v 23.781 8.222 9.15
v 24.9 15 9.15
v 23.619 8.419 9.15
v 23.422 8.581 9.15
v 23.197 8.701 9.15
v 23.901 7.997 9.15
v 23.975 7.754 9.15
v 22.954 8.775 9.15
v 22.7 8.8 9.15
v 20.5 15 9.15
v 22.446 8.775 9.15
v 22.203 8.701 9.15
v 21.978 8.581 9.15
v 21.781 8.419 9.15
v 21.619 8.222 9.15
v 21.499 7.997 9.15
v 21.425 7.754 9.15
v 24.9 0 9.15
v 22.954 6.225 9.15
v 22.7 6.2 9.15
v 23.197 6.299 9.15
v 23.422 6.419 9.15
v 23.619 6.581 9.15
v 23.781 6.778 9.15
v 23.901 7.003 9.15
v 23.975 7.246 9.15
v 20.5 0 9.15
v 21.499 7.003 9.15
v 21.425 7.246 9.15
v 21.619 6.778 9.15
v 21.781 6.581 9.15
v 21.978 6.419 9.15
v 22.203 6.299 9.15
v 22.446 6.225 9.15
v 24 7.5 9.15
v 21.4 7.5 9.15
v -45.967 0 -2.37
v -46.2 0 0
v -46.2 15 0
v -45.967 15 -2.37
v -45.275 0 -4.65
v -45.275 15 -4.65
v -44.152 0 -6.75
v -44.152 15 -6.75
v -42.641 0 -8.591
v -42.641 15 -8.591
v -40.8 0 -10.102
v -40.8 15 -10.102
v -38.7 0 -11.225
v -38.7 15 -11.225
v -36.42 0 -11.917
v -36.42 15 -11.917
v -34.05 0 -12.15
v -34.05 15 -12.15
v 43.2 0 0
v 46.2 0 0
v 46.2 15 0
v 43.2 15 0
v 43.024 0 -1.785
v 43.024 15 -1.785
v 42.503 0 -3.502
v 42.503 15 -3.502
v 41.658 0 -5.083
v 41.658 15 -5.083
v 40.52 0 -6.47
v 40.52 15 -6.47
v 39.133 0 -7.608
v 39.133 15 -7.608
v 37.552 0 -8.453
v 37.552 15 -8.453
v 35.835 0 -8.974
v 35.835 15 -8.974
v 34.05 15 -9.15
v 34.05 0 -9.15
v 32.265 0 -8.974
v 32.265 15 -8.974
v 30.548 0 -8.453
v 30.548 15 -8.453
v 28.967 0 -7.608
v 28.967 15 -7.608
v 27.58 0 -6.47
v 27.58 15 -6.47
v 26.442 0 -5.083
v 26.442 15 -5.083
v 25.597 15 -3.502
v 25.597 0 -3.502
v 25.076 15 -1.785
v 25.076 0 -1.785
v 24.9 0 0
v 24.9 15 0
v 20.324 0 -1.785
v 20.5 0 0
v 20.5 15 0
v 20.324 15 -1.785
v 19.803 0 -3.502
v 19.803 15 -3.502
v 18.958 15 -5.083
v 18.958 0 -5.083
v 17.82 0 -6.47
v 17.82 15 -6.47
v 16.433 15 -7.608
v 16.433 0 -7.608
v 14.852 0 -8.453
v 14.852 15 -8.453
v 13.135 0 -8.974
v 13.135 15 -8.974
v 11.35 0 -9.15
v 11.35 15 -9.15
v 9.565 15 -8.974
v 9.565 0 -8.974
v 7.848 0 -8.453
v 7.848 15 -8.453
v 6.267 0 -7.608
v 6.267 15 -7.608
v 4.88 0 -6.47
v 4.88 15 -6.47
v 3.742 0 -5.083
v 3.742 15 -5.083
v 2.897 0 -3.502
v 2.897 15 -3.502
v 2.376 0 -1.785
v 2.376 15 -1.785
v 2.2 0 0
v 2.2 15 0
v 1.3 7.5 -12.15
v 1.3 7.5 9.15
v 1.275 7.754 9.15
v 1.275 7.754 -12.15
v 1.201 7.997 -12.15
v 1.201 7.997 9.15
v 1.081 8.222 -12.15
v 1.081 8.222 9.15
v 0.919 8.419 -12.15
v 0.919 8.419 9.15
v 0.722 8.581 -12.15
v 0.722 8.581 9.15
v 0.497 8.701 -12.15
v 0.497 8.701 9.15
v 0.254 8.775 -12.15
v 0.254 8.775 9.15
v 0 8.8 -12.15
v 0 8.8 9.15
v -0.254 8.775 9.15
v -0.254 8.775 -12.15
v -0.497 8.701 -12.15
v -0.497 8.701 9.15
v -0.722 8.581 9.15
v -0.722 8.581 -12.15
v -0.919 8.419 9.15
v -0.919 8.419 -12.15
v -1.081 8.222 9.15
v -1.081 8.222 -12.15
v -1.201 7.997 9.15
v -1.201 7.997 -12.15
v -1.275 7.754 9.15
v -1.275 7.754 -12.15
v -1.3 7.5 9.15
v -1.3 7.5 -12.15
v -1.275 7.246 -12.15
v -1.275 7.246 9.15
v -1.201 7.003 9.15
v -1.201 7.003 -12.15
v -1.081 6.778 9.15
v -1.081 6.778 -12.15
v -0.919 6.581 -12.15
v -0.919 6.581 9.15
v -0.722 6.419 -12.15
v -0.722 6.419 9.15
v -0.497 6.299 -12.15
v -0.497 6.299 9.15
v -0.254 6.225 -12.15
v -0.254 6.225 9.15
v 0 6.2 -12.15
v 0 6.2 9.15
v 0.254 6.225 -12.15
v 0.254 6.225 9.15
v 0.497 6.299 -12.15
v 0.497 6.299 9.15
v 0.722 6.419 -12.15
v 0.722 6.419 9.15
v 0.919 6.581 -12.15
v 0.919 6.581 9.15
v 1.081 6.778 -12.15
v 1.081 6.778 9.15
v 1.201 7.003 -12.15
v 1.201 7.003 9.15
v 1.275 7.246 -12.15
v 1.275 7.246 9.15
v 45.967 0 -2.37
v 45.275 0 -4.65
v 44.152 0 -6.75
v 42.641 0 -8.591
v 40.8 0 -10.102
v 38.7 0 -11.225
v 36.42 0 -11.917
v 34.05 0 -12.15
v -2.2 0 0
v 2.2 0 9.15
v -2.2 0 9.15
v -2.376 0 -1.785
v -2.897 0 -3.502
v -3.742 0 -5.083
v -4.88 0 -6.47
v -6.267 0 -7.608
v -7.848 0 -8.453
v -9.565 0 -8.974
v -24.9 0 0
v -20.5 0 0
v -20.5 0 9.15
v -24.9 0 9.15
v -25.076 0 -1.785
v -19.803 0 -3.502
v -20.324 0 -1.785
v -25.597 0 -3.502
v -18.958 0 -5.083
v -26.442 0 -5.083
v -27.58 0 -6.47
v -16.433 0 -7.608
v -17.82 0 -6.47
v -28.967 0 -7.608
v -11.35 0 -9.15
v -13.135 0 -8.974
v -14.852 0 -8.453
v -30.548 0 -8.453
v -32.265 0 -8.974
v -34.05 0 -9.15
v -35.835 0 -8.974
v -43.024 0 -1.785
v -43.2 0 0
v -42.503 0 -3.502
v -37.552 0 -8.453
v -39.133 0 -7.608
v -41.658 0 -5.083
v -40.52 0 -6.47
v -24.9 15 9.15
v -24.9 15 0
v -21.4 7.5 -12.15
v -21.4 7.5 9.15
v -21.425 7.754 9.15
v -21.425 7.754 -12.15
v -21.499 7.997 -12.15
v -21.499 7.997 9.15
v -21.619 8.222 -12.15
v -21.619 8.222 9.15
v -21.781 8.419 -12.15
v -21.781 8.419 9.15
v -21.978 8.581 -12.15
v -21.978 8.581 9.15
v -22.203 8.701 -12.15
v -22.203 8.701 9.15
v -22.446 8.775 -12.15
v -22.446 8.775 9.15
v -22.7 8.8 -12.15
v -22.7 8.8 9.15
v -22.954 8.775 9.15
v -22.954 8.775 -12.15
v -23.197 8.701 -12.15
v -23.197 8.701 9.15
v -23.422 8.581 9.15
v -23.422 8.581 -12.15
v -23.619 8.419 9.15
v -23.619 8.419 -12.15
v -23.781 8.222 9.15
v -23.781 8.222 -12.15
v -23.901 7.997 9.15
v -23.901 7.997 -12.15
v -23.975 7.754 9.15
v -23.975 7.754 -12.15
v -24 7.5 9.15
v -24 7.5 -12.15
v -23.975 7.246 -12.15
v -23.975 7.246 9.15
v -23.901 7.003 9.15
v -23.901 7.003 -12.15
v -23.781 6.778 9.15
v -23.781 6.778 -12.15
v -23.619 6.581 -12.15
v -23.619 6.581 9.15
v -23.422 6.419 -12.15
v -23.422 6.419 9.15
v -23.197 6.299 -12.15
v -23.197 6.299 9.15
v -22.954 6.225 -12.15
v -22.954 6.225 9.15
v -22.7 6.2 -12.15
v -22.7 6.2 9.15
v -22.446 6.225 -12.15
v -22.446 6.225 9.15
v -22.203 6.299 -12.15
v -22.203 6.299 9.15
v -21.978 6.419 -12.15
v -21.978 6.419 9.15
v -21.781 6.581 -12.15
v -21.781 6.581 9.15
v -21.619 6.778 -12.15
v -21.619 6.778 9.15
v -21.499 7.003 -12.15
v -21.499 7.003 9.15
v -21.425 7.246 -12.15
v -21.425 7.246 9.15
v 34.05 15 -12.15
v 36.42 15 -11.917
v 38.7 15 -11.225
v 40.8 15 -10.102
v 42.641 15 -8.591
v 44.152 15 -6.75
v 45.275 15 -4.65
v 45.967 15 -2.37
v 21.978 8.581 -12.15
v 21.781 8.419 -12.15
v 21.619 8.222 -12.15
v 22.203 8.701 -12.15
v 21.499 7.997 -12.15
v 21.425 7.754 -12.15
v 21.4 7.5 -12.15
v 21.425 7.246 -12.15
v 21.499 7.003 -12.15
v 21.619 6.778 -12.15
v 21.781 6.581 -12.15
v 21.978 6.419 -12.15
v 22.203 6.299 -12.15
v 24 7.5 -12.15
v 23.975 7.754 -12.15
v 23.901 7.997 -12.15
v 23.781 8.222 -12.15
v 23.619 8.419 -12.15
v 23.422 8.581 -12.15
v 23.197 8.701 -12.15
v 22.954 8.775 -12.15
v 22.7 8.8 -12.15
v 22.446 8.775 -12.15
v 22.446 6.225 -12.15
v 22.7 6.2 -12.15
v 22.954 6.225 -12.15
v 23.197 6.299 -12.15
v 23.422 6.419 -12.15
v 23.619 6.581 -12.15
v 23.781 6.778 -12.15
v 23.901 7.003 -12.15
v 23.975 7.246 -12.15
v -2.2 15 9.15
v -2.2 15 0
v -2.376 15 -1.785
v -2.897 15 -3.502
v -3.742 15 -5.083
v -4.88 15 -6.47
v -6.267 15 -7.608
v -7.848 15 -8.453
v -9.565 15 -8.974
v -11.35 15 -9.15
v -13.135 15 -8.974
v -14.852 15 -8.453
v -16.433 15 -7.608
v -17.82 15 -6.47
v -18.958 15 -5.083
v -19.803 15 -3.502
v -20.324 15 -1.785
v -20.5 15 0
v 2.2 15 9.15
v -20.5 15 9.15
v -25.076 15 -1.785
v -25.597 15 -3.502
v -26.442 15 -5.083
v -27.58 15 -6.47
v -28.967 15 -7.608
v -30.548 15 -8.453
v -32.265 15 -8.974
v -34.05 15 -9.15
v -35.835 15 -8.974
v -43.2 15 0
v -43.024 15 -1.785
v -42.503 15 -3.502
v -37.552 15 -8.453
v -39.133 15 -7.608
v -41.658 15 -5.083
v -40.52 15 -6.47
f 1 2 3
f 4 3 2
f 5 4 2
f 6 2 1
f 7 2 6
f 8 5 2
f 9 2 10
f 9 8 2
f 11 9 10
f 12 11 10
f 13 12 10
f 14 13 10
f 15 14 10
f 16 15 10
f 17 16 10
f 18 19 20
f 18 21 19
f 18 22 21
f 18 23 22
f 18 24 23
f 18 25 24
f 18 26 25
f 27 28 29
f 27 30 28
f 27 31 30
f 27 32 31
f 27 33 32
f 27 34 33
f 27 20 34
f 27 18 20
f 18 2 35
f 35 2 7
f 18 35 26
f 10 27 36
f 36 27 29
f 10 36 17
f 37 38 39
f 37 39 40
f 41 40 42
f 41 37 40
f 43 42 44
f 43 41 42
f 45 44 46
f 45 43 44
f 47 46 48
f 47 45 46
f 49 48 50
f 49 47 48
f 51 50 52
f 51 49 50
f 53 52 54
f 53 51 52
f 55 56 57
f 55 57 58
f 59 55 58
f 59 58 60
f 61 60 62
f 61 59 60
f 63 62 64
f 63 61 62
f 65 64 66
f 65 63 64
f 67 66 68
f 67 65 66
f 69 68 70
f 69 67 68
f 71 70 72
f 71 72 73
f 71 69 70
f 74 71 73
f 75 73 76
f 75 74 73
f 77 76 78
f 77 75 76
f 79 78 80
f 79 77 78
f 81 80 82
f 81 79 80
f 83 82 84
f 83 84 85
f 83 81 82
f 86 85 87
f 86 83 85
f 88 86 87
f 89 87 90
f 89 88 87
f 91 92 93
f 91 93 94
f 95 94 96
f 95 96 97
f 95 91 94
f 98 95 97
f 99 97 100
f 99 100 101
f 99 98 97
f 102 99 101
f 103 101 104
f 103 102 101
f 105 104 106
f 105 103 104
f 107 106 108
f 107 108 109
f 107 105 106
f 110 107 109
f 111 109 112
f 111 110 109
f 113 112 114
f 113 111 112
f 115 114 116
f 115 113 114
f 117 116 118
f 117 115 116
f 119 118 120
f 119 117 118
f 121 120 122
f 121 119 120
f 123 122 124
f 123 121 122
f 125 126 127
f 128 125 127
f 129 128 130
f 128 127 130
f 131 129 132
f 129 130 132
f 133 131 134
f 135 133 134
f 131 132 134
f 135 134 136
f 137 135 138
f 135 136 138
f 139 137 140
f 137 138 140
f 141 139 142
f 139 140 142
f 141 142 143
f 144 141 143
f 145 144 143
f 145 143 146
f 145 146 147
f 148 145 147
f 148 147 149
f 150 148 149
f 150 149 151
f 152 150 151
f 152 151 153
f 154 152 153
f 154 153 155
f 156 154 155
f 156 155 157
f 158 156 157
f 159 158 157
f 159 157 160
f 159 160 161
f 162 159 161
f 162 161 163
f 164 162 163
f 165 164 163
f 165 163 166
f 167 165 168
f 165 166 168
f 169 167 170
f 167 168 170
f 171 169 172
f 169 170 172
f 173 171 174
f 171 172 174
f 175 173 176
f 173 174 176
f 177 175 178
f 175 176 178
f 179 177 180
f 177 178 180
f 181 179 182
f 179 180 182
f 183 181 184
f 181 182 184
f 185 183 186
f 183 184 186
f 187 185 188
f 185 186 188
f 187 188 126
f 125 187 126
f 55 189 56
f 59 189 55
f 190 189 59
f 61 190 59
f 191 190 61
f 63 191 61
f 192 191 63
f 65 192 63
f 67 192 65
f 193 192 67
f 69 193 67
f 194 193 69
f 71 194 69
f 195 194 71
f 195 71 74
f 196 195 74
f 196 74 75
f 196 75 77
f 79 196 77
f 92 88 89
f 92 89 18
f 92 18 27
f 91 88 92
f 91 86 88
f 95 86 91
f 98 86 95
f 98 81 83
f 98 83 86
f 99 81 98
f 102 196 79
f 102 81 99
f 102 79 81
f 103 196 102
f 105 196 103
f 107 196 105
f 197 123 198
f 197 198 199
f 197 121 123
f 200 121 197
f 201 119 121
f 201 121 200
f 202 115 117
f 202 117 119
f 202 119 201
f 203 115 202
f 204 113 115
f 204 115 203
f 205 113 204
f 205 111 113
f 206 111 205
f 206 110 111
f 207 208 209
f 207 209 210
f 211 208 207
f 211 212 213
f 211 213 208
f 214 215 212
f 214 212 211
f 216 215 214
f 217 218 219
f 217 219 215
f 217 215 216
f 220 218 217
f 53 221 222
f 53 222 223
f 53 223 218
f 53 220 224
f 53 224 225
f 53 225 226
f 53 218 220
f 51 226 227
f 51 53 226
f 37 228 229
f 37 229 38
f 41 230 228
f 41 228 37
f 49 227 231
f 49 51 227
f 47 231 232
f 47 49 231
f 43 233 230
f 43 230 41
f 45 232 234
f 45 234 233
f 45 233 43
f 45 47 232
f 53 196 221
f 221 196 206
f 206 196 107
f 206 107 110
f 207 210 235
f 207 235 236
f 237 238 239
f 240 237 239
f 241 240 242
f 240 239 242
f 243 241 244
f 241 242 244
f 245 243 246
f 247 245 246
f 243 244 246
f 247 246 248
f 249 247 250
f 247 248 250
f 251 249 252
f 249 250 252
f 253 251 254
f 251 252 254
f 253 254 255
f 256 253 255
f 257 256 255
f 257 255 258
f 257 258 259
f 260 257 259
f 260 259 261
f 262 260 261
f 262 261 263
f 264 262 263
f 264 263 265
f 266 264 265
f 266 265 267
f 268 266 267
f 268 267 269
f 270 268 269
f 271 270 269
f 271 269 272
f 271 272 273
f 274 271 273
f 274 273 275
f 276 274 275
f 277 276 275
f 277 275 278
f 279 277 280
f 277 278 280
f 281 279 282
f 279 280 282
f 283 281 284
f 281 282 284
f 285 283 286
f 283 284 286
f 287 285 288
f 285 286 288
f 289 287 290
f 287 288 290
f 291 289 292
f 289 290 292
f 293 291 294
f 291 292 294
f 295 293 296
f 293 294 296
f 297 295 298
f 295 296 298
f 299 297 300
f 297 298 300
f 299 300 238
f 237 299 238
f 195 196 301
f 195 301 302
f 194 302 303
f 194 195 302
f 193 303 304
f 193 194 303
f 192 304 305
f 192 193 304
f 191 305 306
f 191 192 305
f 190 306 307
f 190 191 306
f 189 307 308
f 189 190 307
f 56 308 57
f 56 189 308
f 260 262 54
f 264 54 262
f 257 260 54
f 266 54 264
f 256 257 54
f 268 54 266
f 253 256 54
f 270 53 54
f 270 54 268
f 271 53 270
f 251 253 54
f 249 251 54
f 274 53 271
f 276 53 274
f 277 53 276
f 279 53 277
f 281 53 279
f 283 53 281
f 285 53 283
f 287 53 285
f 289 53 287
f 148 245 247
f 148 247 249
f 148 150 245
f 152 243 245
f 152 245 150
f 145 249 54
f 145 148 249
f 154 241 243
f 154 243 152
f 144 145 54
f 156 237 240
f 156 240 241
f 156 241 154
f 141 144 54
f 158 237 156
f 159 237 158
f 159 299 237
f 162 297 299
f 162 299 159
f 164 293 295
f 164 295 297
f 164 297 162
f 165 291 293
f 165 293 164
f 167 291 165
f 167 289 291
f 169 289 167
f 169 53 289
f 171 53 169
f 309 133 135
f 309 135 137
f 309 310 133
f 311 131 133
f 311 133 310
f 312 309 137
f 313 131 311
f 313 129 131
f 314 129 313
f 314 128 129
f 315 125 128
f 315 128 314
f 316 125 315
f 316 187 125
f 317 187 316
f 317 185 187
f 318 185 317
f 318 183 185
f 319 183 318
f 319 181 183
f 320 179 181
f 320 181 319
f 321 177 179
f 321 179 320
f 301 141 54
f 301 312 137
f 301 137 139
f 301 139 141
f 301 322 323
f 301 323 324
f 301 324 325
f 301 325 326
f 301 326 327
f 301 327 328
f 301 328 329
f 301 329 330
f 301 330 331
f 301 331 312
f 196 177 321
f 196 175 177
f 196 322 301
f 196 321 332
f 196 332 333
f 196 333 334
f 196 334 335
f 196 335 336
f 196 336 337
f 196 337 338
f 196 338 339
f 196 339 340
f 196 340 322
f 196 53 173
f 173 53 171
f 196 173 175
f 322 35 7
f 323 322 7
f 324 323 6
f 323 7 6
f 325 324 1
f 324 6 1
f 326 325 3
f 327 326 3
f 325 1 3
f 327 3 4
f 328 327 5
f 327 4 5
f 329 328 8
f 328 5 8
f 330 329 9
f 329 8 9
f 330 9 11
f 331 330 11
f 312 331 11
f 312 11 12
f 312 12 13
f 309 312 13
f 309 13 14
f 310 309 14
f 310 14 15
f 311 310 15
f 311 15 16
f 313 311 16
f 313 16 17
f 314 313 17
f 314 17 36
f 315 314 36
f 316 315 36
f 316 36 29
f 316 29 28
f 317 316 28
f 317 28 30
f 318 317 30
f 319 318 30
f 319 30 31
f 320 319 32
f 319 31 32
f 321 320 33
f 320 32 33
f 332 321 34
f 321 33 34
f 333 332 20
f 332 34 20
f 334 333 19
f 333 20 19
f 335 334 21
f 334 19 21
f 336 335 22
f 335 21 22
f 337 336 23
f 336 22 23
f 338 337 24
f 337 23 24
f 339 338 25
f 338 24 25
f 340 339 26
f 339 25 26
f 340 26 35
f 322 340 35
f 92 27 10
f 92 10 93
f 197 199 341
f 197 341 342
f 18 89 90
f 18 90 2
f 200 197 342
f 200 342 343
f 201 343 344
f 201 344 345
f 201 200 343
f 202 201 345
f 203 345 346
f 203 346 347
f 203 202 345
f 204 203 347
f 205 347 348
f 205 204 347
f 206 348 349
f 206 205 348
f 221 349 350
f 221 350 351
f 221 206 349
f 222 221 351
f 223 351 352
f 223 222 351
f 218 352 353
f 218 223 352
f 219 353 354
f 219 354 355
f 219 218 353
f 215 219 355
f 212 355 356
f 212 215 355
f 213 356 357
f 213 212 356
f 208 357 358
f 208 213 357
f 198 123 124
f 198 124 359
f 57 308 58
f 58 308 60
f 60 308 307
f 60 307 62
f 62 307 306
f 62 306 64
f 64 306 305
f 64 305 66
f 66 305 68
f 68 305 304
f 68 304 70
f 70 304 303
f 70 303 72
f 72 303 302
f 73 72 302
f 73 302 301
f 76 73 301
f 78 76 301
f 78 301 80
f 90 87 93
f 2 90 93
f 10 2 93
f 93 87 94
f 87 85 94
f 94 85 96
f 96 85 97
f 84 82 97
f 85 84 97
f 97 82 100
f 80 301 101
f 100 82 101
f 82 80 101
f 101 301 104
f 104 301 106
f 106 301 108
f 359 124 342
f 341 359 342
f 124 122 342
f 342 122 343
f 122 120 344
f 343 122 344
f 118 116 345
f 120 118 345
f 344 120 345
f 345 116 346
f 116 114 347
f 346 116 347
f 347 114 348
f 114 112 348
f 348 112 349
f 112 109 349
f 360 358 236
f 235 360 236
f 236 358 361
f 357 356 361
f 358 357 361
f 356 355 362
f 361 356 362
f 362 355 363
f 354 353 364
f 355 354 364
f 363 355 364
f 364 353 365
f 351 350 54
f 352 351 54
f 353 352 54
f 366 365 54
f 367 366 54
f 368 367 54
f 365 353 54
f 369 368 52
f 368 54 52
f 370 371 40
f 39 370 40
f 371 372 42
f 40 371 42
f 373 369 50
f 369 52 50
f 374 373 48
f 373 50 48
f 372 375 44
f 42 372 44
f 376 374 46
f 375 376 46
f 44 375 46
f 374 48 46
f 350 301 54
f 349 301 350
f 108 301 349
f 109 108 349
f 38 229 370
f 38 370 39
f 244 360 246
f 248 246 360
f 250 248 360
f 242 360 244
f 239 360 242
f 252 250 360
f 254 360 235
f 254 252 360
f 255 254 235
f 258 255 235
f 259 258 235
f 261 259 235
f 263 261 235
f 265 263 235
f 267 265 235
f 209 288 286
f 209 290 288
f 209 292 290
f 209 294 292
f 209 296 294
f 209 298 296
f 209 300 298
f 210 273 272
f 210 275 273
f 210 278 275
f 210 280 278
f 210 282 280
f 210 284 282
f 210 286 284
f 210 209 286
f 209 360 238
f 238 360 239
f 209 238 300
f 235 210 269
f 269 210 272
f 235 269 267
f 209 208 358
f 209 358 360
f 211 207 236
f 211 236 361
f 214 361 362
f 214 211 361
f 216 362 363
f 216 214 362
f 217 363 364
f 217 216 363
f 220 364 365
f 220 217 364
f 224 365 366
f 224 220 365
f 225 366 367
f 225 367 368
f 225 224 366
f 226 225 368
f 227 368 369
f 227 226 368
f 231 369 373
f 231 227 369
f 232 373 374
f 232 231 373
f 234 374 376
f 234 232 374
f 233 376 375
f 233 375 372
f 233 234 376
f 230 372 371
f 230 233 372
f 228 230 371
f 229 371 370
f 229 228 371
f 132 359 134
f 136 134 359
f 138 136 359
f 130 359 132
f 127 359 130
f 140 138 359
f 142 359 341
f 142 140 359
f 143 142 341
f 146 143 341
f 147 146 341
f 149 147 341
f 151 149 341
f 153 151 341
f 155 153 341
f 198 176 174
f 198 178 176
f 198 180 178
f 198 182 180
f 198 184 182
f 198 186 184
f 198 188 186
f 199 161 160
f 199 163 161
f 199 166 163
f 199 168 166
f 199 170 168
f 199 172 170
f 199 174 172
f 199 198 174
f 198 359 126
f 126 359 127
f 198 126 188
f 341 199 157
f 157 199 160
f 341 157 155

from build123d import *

# Parameters (mm, degrees)
BOSS_EXTRUDE1_DEPTH  = 15
M2_CLEARANCE_HOLE2_D = 2.6


with BuildPart() as part:
    # Sketch1 → Boss-Extrude1 (new body)
    with BuildSketch(Plane(origin=(0, 0, 0), x_dir=(1, 0, 0), z_dir=(0, 1, 0))):
        with BuildLine():
            Line((2.2, 0), (2.2, -9.15))
            Line((2.2, -9.15), (-2.2, -9.15))
            Line((-2.2, -9.15), (-2.2, 0))
            ThreePointArc((-2.2, 0), (-11.35, 9.15), (-20.5, 0))
            Line((-20.5, 0), (-20.5, -9.15))
            Line((-20.5, -9.15), (-24.9, -9.15))
            Line((-24.9, -9.15), (-24.9, 0))
            ThreePointArc((-24.9, 0), (-34.05, 9.15), (-43.2, 0))
            Line((-43.2, 0), (-46.2, 0))
            ThreePointArc((-46.2, 0), (-42.641347391, 8.591347391), (-34.05, 12.15))
            Line((-34.05, 12.15), (34.05, 12.15))
            ThreePointArc((34.05, 12.15), (42.641347391, 8.591347391), (46.2, 0))
            Line((46.2, 0), (43.2, 0))
            ThreePointArc((43.2, 0), (34.05, 9.15), (24.9, 0))
            Line((24.9, 0), (24.9, -9.15))
            Line((24.9, -9.15), (20.5, -9.15))
            Line((20.5, -9.15), (20.5, 0))
            ThreePointArc((20.5, 0), (11.35, 9.15), (2.2, 0))
        make_face()
    extrude(amount=BOSS_EXTRUDE1_DEPTH)

    # M2 Clearance Hole2 (through all)
    with Locations(Plane(origin=(0, 0, -12.15), x_dir=(-1, 0, 0), z_dir=(0, 0, -1))):
        with Locations((0, 7.5), (-22.7, 7.5), (22.7, 7.5)):
            Hole(M2_CLEARANCE_HOLE2_D / 2)


solid = part.part
